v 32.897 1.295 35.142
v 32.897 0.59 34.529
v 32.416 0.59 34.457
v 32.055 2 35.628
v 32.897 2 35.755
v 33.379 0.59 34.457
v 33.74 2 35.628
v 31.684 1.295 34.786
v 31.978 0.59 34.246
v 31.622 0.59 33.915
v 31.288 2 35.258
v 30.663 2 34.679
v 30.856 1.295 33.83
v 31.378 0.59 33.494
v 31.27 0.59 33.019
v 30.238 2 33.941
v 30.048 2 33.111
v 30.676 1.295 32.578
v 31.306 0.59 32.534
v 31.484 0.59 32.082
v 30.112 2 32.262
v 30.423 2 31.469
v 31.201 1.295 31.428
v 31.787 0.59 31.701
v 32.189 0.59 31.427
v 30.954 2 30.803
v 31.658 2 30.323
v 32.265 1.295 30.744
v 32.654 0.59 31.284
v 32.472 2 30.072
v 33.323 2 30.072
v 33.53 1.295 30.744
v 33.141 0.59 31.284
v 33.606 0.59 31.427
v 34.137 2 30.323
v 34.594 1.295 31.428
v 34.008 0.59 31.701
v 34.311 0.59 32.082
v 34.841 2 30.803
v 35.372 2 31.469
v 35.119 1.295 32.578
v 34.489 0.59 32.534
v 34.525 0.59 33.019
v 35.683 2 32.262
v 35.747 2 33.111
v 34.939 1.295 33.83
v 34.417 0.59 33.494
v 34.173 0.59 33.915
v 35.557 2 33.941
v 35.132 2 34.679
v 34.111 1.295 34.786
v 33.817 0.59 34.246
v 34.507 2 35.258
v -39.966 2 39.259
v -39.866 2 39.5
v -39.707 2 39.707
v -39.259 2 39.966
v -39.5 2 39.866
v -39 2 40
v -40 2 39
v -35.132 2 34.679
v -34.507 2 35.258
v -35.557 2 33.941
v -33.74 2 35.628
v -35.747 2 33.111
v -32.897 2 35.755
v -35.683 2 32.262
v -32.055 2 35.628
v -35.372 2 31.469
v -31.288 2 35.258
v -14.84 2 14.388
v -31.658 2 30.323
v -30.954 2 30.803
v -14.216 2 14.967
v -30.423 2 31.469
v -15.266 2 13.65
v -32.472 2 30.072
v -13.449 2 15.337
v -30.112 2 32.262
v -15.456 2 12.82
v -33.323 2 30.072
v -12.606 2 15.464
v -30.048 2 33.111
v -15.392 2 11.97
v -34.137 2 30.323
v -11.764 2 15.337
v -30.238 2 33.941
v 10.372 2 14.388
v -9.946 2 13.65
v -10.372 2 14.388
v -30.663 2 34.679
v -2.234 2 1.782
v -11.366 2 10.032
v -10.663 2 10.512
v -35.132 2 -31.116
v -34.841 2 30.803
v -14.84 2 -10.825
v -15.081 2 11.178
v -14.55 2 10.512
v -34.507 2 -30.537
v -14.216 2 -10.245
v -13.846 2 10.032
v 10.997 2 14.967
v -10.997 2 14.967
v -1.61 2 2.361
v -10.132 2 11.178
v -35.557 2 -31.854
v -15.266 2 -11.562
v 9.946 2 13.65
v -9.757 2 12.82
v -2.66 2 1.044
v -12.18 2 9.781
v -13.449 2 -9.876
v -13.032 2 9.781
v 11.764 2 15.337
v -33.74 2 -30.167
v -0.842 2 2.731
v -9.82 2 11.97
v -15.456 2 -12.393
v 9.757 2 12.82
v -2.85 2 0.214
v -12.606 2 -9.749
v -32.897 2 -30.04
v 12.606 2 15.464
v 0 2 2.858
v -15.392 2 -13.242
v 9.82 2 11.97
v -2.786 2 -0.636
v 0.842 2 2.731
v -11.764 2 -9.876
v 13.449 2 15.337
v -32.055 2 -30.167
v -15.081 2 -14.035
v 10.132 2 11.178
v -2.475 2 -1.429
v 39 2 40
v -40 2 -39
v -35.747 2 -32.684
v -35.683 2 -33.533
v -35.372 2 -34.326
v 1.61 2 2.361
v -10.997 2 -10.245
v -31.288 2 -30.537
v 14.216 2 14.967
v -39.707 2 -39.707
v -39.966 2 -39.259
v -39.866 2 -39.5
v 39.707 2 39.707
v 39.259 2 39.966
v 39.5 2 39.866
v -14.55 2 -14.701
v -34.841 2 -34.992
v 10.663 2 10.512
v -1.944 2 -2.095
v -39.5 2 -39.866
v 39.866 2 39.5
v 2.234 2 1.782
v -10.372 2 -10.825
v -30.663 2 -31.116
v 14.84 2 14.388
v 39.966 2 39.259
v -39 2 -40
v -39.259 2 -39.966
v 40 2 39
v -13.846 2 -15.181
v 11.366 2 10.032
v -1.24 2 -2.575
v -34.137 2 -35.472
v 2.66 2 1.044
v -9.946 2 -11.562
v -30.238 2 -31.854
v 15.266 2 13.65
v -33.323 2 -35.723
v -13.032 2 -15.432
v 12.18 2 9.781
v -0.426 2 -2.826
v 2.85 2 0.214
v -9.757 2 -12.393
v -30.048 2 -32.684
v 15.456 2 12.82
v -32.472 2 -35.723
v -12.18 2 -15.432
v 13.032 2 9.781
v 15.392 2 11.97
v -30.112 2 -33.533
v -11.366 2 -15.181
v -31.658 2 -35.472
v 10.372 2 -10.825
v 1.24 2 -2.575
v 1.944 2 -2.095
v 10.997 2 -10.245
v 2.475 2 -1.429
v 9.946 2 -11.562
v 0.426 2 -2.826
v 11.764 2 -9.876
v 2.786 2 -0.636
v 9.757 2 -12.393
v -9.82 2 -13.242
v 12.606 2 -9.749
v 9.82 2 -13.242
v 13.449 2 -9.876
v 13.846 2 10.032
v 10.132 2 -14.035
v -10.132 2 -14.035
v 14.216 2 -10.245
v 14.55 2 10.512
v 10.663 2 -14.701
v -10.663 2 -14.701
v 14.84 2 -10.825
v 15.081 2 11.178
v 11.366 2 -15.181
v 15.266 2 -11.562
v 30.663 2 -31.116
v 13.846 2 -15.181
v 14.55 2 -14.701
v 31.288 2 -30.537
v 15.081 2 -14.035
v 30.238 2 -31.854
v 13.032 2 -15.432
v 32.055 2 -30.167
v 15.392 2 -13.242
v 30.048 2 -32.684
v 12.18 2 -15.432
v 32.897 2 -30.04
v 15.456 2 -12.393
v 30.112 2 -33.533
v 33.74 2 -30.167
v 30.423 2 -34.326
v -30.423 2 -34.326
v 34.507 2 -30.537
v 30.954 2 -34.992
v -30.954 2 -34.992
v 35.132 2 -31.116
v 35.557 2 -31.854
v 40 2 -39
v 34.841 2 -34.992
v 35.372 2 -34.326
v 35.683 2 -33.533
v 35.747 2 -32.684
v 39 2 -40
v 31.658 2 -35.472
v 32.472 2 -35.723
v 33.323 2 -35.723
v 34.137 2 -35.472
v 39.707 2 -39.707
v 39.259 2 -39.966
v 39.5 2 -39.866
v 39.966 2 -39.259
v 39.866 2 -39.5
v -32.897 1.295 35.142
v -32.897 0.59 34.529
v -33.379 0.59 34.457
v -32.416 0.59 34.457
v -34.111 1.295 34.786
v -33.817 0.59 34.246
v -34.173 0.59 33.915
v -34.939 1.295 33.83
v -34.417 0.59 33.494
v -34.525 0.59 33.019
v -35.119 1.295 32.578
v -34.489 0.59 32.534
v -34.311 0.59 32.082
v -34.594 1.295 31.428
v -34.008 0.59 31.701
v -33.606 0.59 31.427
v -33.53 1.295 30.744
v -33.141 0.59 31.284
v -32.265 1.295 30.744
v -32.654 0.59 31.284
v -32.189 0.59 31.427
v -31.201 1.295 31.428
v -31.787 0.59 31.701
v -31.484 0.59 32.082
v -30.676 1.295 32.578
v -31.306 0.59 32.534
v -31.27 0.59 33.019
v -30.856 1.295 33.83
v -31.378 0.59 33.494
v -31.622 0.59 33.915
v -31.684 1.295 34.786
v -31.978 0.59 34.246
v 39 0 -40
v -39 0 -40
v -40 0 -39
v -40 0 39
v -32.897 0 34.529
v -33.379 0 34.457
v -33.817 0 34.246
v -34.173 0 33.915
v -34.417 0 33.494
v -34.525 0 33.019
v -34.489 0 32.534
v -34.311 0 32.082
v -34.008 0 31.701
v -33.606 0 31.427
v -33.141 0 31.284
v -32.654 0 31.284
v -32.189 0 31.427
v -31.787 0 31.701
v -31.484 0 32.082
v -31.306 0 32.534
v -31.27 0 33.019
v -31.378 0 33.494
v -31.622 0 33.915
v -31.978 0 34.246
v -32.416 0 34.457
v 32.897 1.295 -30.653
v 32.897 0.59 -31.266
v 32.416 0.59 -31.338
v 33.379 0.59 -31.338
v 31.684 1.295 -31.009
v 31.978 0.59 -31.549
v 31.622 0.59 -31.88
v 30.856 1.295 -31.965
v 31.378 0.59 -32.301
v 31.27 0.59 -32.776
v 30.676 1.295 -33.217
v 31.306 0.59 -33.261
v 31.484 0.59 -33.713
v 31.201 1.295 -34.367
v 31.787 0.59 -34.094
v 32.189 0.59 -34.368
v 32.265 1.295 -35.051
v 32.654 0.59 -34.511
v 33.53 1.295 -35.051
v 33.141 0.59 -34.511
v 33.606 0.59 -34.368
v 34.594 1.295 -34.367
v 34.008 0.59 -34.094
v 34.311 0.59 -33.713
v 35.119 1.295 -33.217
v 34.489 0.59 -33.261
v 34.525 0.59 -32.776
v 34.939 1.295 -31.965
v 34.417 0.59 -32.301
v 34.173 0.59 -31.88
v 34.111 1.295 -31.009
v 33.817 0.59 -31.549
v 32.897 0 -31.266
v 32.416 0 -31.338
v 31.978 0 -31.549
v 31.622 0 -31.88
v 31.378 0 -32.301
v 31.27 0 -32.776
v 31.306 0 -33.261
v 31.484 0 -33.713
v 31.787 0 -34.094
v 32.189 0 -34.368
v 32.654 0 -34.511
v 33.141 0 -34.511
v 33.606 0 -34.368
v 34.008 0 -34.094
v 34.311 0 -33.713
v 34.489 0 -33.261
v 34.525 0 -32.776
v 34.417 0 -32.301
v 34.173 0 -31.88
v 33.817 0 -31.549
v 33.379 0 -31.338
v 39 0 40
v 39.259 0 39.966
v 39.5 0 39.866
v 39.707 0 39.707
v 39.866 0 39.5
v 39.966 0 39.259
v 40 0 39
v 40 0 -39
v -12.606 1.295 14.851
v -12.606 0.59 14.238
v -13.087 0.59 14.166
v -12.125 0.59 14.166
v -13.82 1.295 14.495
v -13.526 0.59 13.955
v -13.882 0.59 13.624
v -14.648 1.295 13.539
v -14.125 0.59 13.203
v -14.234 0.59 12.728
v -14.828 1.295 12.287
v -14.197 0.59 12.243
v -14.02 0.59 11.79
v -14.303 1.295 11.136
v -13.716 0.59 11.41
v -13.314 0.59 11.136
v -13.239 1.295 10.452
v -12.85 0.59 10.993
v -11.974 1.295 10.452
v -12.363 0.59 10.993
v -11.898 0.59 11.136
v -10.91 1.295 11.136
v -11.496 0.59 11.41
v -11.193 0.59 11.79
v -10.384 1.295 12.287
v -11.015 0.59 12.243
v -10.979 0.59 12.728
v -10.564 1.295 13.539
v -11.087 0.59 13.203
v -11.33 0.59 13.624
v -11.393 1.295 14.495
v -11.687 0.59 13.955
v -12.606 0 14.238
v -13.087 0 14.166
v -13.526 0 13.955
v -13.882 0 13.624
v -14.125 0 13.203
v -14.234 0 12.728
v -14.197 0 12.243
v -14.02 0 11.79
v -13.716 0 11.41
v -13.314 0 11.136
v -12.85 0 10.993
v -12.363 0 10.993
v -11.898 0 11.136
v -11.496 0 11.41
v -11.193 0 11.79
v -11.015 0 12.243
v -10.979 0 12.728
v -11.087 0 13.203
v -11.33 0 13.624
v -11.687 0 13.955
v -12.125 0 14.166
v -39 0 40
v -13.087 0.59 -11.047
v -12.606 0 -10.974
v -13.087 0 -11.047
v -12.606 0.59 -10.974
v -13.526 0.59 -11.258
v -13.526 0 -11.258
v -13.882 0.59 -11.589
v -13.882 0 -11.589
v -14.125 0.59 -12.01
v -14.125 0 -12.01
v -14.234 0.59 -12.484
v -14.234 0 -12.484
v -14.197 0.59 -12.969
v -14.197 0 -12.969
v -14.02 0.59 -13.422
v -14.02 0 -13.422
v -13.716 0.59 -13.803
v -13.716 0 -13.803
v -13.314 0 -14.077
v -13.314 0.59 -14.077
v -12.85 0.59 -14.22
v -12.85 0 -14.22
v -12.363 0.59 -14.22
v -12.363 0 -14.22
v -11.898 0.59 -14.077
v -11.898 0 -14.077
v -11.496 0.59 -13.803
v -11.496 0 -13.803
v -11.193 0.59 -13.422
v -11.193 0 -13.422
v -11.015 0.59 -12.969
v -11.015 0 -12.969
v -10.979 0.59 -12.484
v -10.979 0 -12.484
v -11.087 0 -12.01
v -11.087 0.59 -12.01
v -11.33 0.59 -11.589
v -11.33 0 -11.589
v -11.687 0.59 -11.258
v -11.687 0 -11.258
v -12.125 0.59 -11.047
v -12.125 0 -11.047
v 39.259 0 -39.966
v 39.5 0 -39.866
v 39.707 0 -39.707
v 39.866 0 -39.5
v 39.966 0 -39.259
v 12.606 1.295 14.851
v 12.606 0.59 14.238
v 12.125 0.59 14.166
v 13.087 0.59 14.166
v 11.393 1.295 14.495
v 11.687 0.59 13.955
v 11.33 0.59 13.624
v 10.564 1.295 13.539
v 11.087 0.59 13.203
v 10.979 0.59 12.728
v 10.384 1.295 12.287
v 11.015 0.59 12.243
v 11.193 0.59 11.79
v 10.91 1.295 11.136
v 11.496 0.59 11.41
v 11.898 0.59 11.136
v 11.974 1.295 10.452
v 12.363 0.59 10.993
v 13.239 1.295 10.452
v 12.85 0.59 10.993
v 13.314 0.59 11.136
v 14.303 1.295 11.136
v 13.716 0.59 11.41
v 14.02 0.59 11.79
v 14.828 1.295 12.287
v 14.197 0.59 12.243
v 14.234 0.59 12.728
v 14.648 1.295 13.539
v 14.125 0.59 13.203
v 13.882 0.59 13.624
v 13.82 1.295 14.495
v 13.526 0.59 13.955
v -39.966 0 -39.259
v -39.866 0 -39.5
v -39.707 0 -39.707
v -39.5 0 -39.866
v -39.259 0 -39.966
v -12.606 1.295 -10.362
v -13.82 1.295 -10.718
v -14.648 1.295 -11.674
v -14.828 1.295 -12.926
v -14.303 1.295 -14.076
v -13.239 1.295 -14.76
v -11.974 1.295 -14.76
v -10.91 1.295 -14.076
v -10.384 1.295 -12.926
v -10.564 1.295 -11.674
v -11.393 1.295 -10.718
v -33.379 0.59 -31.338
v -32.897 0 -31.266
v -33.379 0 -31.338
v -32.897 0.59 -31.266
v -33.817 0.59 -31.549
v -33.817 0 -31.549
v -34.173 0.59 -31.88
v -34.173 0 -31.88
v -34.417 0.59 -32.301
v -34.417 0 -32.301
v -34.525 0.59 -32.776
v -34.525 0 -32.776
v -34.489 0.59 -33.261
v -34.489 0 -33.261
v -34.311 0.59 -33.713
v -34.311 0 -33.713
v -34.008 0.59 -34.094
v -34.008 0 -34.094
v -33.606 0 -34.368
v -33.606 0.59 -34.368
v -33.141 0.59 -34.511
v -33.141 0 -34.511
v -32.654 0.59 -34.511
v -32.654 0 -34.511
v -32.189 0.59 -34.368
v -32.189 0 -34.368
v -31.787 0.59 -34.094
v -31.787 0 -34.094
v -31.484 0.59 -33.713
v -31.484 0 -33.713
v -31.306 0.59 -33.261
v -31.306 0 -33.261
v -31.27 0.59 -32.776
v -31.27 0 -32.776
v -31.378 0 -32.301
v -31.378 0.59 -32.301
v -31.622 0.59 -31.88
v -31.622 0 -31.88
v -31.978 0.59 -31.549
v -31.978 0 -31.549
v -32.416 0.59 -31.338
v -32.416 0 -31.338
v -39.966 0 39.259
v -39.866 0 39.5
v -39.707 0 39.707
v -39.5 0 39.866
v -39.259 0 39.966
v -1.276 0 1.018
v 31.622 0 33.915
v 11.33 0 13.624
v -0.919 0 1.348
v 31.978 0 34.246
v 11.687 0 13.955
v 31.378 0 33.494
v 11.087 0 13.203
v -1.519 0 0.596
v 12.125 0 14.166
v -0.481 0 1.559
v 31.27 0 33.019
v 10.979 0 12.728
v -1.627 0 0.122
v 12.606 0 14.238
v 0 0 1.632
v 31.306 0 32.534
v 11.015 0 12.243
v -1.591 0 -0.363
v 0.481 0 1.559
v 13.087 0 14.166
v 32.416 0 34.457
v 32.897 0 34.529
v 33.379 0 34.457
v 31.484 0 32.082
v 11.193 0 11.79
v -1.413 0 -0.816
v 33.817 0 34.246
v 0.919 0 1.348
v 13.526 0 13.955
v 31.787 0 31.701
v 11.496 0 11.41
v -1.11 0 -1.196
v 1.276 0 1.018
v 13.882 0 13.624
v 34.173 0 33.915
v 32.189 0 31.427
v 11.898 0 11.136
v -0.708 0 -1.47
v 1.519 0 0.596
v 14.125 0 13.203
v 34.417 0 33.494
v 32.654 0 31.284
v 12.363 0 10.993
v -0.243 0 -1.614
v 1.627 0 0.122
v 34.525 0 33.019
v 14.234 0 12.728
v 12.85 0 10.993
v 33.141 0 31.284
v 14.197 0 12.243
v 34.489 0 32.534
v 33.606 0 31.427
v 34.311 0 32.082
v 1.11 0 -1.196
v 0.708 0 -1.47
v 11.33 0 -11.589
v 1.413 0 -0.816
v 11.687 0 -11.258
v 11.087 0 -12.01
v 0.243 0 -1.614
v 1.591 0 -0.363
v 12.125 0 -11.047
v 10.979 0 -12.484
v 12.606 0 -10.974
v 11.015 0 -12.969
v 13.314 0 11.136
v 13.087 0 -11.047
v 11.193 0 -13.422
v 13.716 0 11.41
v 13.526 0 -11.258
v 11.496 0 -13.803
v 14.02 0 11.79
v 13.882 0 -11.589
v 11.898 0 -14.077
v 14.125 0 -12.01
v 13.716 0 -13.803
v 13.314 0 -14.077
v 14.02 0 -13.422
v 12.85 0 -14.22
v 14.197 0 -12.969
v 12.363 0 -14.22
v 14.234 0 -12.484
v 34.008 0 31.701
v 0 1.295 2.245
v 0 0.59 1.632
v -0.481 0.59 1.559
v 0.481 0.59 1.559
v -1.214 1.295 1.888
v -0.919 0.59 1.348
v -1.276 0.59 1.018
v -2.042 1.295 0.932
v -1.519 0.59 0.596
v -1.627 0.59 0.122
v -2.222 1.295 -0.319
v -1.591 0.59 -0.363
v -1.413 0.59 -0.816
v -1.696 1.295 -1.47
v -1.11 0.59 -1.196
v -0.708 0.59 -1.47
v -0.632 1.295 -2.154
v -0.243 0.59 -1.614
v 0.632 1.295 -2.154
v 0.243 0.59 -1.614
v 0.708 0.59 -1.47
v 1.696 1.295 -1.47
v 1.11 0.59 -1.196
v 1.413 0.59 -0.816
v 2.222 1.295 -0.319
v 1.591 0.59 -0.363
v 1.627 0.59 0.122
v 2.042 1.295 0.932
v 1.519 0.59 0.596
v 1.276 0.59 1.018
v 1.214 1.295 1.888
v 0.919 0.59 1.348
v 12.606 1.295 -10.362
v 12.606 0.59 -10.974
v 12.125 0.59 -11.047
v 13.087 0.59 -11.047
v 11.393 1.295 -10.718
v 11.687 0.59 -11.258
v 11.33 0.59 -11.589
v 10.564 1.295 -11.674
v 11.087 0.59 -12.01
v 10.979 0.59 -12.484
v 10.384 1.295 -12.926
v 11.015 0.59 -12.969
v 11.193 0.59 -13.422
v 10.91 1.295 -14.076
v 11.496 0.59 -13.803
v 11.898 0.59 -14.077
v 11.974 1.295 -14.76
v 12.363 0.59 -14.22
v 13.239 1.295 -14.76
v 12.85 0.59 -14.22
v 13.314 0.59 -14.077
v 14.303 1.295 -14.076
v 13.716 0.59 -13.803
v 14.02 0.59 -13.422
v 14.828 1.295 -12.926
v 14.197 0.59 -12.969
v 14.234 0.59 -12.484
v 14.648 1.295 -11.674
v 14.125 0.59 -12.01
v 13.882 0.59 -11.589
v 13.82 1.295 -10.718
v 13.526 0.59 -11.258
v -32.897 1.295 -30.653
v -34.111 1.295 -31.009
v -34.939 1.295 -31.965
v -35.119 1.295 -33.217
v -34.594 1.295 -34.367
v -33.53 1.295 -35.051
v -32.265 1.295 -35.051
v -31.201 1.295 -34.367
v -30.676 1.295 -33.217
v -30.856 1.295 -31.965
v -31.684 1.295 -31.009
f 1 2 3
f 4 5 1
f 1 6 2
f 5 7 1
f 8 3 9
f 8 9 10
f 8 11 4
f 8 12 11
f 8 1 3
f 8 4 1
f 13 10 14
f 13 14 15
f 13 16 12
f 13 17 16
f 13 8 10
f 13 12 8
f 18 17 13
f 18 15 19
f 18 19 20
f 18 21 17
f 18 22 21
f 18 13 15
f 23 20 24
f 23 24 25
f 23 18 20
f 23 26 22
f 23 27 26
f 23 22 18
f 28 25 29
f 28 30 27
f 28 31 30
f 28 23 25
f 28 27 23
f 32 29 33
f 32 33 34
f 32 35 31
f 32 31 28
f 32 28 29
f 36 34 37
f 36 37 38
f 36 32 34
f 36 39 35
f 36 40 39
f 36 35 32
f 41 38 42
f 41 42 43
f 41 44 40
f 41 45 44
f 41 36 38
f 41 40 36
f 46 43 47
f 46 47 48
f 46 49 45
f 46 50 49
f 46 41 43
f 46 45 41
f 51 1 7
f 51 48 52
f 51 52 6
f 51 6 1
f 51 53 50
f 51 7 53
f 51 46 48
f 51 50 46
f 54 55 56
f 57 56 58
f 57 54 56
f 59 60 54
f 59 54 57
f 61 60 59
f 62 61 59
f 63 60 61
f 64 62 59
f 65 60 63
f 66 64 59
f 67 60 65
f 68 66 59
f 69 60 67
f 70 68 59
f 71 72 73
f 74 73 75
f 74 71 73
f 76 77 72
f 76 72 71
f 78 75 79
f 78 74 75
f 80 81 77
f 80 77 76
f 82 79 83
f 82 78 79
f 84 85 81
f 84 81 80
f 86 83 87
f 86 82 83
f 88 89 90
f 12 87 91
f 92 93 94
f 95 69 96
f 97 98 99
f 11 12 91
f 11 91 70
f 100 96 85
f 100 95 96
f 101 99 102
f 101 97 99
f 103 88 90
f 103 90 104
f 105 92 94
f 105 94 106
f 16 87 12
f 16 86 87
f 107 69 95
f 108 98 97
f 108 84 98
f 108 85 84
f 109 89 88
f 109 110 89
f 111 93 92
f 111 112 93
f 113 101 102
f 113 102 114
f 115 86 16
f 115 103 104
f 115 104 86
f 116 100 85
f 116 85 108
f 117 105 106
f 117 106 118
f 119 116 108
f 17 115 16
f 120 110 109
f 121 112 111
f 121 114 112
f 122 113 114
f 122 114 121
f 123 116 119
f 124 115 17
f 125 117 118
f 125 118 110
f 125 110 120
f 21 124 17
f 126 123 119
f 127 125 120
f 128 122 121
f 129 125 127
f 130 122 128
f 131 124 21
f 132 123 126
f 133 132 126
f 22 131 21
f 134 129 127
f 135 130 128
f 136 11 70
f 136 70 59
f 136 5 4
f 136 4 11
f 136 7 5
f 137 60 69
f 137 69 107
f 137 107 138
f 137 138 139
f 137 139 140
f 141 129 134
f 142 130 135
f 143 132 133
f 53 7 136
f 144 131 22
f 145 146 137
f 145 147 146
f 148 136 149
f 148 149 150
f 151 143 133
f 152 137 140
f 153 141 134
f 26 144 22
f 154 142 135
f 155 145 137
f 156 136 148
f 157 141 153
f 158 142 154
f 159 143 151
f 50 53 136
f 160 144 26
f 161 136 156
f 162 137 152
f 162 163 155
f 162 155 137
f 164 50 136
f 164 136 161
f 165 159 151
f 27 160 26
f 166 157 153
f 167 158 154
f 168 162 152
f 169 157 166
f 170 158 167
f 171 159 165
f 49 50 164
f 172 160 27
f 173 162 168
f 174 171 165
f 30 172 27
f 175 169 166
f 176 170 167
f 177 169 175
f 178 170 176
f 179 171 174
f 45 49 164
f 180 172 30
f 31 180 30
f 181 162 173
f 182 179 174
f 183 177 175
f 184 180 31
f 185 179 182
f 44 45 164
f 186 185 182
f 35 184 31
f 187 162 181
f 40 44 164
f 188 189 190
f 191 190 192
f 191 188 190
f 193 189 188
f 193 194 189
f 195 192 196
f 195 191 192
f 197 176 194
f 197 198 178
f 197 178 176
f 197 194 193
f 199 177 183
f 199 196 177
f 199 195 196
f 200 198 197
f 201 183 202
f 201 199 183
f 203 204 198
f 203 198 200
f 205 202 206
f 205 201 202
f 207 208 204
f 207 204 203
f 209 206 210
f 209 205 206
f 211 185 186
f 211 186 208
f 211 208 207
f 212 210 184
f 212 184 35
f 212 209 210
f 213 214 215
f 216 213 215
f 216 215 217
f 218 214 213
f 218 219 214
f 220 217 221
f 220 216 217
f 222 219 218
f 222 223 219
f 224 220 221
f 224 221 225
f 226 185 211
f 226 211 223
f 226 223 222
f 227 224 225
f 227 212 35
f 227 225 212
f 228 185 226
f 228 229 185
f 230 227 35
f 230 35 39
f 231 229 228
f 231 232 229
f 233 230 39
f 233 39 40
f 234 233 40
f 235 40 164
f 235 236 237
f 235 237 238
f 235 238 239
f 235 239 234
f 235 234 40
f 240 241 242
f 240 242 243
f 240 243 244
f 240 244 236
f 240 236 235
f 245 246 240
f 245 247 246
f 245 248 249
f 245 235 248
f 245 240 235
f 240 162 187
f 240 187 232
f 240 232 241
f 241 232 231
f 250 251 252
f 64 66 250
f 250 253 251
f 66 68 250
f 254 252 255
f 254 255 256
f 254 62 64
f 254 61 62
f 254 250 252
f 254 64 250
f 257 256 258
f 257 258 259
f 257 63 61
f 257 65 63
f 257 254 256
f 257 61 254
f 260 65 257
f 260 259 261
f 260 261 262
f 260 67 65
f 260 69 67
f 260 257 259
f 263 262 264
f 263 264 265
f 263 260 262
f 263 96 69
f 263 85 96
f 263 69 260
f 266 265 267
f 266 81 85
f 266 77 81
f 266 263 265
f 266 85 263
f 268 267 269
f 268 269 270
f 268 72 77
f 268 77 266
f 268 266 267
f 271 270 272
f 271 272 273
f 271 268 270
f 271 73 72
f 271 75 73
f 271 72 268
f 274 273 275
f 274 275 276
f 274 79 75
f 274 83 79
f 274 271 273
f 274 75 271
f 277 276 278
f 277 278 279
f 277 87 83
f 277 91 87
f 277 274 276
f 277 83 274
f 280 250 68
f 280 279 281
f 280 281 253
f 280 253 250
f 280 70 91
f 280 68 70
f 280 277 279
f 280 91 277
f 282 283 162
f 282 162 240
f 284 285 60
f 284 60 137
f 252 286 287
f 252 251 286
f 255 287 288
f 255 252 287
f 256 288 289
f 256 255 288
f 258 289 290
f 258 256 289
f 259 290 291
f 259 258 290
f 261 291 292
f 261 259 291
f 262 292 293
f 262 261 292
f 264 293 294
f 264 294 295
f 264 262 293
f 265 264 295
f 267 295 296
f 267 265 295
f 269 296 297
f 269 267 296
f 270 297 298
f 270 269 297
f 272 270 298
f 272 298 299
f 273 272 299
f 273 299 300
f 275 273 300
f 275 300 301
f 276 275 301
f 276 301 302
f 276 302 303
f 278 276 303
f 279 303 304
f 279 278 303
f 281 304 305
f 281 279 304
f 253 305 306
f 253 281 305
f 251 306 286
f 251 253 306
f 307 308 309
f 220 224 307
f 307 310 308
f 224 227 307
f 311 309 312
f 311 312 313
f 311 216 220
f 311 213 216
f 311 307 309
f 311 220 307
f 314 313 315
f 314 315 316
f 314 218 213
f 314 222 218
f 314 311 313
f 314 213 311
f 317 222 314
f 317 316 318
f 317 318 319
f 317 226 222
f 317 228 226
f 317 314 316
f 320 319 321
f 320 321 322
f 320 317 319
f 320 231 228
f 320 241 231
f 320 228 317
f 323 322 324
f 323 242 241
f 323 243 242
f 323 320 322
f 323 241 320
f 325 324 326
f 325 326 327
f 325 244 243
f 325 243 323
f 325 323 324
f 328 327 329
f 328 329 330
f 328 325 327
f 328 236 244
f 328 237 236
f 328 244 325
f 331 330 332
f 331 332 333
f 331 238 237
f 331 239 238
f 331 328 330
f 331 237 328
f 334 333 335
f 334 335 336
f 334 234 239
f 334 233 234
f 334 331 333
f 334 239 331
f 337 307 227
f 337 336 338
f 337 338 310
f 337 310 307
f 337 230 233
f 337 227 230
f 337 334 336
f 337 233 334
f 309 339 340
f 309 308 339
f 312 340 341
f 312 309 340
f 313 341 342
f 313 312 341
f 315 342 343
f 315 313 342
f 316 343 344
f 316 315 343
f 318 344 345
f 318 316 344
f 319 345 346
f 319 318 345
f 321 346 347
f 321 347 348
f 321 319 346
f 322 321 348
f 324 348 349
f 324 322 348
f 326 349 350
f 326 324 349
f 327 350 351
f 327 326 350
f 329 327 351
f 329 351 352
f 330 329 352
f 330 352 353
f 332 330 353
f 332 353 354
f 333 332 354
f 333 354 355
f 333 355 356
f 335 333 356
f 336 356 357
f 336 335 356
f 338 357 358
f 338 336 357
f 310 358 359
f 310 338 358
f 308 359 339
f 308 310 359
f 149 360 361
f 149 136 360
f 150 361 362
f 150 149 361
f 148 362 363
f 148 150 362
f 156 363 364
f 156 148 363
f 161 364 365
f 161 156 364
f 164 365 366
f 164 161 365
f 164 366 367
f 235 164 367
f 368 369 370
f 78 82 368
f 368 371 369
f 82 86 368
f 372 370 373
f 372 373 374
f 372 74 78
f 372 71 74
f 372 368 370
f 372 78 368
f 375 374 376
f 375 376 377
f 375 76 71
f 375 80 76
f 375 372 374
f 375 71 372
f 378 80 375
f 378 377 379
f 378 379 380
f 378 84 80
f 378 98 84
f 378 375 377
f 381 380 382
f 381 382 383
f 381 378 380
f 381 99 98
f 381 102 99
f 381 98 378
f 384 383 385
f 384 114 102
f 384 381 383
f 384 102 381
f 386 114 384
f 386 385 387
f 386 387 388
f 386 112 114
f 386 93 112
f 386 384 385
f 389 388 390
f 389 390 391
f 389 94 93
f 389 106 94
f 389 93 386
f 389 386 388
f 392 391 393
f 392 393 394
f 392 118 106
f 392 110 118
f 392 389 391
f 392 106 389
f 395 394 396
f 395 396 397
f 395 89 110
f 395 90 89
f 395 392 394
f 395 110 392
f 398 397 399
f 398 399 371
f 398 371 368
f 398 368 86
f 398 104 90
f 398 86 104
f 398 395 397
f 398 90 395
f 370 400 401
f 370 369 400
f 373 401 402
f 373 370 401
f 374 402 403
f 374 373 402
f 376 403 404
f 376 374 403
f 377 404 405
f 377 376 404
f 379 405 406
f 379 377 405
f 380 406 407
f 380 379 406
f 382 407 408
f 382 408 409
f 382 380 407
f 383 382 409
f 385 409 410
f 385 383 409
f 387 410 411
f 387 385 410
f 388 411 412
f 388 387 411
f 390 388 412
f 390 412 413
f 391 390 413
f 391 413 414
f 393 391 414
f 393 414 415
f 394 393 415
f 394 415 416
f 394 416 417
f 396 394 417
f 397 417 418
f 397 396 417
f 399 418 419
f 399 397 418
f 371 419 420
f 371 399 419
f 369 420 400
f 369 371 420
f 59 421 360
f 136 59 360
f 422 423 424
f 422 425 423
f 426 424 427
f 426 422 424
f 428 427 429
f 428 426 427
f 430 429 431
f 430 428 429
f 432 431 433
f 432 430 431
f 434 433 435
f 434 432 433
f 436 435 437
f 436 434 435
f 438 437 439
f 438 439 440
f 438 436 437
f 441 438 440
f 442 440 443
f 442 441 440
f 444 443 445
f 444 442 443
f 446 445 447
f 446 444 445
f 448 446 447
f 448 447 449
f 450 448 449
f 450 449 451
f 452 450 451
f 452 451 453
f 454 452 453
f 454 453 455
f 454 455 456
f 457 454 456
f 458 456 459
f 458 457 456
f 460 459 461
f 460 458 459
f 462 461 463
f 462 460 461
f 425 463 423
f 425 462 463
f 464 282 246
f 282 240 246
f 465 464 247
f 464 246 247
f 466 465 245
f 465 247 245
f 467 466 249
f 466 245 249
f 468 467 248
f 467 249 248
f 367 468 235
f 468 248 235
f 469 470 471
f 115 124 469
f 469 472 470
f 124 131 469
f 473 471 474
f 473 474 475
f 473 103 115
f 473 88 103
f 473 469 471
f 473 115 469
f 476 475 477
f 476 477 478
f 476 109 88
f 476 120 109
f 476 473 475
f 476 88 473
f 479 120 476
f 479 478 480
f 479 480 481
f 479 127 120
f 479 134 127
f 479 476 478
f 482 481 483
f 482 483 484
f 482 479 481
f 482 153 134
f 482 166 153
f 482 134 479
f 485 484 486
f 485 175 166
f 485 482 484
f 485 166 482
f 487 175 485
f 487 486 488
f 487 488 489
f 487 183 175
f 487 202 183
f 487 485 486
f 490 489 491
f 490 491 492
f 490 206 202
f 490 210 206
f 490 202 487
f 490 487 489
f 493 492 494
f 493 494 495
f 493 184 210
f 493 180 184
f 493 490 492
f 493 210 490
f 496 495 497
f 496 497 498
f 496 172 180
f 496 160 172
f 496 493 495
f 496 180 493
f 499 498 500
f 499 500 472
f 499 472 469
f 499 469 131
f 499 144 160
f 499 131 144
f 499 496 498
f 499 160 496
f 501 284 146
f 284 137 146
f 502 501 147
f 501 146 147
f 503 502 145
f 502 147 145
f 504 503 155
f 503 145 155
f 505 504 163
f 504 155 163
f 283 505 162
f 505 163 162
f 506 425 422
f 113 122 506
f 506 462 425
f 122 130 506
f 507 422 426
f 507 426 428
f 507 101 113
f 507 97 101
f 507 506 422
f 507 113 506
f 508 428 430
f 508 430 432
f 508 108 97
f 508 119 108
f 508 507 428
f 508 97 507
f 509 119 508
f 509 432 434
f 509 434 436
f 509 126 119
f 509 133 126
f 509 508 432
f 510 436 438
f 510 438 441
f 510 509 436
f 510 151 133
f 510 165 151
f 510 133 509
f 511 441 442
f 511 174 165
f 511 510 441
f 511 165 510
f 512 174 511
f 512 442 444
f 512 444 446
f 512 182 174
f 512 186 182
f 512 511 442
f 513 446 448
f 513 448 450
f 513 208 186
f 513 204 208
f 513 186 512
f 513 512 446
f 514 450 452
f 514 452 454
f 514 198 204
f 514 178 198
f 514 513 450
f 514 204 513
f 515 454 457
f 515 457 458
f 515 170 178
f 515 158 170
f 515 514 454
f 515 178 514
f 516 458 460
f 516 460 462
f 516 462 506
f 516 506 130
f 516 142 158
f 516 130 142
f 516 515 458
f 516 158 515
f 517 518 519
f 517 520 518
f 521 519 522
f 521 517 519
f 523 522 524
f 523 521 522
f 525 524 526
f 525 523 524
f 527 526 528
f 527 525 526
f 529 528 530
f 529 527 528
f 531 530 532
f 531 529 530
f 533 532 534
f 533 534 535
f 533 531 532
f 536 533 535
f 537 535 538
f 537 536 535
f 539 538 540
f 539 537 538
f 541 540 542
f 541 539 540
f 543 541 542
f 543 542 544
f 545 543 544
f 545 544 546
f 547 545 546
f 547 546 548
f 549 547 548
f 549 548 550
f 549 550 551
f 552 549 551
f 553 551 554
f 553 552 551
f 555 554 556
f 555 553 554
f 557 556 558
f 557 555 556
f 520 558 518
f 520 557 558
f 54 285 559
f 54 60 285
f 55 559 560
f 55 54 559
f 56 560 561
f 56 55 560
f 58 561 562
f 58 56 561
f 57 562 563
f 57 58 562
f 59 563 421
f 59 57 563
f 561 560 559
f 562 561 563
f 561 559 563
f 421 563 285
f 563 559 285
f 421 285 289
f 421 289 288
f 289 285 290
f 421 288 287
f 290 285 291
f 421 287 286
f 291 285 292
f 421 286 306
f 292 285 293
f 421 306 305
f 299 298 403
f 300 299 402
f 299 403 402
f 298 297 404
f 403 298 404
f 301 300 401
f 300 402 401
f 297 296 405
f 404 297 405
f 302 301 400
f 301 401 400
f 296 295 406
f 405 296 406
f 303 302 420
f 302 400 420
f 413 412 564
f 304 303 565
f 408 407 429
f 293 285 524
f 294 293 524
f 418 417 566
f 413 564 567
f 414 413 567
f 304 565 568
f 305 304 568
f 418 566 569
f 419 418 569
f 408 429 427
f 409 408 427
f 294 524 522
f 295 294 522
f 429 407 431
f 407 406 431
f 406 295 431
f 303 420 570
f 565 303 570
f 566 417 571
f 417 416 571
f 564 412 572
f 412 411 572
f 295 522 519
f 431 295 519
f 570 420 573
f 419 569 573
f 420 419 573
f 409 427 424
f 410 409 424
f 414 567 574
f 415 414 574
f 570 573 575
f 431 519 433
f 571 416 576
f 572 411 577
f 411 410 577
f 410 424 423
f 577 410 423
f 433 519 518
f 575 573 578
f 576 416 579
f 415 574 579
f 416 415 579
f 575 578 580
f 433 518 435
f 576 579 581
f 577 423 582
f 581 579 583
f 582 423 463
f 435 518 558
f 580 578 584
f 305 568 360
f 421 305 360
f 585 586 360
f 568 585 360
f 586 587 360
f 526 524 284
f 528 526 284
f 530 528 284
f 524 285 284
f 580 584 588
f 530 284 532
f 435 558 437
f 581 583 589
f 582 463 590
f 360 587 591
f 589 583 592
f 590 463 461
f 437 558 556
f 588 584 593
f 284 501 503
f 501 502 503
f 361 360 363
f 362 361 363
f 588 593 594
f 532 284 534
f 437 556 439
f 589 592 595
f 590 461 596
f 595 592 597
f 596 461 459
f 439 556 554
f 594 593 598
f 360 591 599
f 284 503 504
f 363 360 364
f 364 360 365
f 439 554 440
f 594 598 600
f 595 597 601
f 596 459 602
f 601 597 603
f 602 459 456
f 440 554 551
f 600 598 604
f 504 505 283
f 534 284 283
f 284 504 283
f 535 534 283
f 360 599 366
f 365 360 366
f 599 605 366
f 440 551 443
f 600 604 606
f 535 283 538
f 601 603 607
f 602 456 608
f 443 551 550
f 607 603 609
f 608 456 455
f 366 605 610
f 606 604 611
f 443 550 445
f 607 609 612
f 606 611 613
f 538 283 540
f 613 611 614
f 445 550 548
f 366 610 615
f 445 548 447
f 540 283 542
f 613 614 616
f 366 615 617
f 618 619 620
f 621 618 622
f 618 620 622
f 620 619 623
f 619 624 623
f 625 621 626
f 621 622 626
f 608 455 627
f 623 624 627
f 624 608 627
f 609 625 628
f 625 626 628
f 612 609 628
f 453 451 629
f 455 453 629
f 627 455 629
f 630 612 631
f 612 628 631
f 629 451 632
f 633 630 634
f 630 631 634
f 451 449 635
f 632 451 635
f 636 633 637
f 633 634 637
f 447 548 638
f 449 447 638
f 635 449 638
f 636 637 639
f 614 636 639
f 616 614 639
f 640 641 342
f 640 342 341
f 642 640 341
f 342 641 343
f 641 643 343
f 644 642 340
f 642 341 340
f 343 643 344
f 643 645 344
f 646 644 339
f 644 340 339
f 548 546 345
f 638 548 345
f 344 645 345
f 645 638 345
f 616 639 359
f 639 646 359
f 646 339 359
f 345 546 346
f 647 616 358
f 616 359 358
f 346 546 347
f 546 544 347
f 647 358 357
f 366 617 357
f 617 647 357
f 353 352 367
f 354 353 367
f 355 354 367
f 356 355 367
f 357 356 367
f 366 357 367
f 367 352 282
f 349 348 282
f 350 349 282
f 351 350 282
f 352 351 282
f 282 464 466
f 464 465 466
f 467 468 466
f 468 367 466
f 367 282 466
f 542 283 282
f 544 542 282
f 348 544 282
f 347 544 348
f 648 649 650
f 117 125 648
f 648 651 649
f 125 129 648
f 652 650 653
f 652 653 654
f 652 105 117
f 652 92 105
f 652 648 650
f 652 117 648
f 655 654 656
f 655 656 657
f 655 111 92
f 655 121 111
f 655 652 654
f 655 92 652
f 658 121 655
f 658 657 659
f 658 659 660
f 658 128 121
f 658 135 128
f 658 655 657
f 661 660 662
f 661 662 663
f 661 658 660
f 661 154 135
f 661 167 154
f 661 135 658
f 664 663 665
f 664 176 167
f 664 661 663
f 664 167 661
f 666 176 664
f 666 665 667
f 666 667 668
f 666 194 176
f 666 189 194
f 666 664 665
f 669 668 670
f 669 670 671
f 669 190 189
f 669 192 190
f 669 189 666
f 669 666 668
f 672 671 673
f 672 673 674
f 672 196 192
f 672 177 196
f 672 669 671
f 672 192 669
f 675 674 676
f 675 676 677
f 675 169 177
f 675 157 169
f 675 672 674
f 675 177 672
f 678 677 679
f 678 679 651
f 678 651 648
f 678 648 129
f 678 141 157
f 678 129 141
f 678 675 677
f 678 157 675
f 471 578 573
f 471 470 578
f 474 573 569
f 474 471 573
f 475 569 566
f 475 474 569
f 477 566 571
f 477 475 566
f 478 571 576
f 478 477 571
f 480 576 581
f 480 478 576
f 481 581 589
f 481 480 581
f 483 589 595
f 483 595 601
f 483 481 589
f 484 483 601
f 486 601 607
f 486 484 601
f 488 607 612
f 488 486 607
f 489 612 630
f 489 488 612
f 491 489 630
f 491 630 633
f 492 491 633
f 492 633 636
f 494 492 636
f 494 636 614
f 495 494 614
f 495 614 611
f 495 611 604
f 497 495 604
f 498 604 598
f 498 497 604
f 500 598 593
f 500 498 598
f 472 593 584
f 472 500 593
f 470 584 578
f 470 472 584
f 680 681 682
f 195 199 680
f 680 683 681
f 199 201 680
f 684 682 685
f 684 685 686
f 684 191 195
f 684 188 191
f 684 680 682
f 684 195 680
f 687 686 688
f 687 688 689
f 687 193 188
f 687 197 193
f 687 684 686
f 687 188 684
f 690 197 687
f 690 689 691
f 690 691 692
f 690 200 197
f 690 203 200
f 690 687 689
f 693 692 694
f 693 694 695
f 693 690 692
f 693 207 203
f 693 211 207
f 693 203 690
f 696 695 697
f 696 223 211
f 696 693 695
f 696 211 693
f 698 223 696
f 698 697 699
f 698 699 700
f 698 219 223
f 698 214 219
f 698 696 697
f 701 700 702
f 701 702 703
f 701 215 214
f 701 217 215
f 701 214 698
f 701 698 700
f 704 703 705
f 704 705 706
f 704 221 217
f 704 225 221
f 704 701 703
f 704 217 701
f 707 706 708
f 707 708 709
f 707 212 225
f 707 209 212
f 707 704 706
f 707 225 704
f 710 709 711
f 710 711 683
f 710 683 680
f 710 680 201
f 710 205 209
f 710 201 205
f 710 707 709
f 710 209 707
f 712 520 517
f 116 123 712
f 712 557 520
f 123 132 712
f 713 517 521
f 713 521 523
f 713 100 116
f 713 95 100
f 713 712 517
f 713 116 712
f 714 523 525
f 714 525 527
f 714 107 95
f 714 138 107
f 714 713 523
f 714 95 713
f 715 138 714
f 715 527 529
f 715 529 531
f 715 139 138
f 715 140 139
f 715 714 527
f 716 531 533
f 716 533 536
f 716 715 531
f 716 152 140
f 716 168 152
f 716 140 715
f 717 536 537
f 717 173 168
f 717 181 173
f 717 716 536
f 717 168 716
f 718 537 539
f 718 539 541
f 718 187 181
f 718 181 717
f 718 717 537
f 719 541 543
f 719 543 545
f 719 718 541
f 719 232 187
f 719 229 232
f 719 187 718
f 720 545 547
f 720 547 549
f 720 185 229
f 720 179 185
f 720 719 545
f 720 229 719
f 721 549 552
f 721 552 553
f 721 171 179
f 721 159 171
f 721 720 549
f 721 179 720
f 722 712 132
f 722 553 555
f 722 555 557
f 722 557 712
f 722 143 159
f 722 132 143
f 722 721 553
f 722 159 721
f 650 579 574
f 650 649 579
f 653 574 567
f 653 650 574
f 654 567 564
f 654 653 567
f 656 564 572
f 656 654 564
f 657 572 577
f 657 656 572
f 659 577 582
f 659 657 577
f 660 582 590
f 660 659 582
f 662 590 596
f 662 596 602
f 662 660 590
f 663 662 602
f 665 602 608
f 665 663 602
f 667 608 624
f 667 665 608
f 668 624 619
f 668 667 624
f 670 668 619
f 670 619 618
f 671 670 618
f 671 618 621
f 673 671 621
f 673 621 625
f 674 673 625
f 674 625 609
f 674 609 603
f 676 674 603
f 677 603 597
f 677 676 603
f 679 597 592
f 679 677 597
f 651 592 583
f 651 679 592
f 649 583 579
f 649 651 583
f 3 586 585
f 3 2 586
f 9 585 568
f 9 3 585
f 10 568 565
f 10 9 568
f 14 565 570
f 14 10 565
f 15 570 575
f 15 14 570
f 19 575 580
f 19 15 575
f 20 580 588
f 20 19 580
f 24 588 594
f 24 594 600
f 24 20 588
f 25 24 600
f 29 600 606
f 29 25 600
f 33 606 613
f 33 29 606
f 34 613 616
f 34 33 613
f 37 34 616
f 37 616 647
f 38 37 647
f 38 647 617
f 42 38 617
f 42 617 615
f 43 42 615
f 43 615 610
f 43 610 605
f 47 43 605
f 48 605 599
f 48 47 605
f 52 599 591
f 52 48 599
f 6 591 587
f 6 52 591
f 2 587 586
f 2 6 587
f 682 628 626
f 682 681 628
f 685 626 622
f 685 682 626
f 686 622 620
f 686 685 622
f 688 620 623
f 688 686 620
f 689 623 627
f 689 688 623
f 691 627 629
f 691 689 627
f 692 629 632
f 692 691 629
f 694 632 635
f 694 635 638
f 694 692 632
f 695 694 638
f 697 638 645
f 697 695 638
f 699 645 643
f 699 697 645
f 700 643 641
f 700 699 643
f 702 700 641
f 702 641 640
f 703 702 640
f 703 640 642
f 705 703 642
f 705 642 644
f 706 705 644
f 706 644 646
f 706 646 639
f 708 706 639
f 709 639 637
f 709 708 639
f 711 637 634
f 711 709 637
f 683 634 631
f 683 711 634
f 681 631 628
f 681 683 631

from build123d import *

# Parameters (mm, degrees)
ESQUISSE1_W                                  = 80
ESQUISSE1_H                                  = 80
BOSS_EXTRU_1_DEPTH                           = 2
FRAISAGE_POUR_VIS_T_TE_FRAIS_E_BOM_2_COUNT   = 2
FRAISAGE_POUR_VIS_T_TE_FRAIS_E_BOM_2_PITCH   = 65.794986025
FRAISAGE_POUR_VIS_T_TE_FRAIS_E_BOM_3_COUNT   = 2
FRAISAGE_POUR_VIS_T_TE_FRAIS_E_BOM_3_PITCH   = 93.048161572
FRAISAGE_POUR_VIS_T_TE_FRAIS_E_BOM_4_COUNT   = 2
FRAISAGE_POUR_VIS_T_TE_FRAIS_E_BOM_4_PITCH   = 65.794986025
FRAISAGE_POUR_VIS_T_TE_FRAIS_E_BOM_6_A_COUNT = 2
FRAISAGE_POUR_VIS_T_TE_FRAIS_E_BOM_6_A_PITCH = 25.212578074
FRAISAGE_POUR_VIS_T_TE_FRAIS_E_BOM_7_COUNT   = 2
FRAISAGE_POUR_VIS_T_TE_FRAIS_E_BOM_7_PITCH   = 35.655969855
FRAISAGE_POUR_VIS_T_TE_FRAIS_E_BOM_8_COUNT   = 2
FRAISAGE_POUR_VIS_T_TE_FRAIS_E_BOM_8_PITCH   = 25.212578074
CONG_1_R                                     = 1
CONG_2_R                                     = 1


with BuildPart() as part:
    # Esquisse1 → Boss.-Extru.1 (new body)
    with BuildSketch(Plane(origin=(0, 0, 0), x_dir=(1, 0, 0), z_dir=(0, 1, 0))):
        Rectangle(ESQUISSE1_W, ESQUISSE1_H)
    extrude(amount=BOSS_EXTRU_1_DEPTH)

    # Esquisse3 → Fraisage pour vis _ t_te frais_e bomb_e (revolve, cut)
    with BuildSketch(Plane(origin=(-32.897493012, 2, -32.897493012), x_dir=(0, 0, 1), z_dir=(1, 0, 0))):
        Polygon((0, 0), (0, 2), (1.63195, 2), (1.63195, 1.409834001), (2.8575, 0), align=None)
    fraisage_pour_vis_t_te_frais_e_bomb_e = revolve(axis=Axis((-32.897493012, 8.35, -32.897493012), (0, -1, 0)), mode=Mode.SUBTRACT)

    # Fraisage pour vis _ t_te frais_e bom 2: Fraisage pour vis _ t_te frais_e bomb_e ×2
    with Locations(*[(i * FRAISAGE_POUR_VIS_T_TE_FRAIS_E_BOM_2_PITCH, 0, 0) for i in range(1, FRAISAGE_POUR_VIS_T_TE_FRAIS_E_BOM_2_COUNT)]):
        add(fraisage_pour_vis_t_te_frais_e_bomb_e, mode=Mode.SUBTRACT)

    # Fraisage pour vis _ t_te frais_e bom 3: Fraisage pour vis _ t_te frais_e bomb_e ×2
    with Locations(*[Vector(0.707106781, 0, 0.707106781) * (i * FRAISAGE_POUR_VIS_T_TE_FRAIS_E_BOM_3_PITCH) for i in range(1, FRAISAGE_POUR_VIS_T_TE_FRAIS_E_BOM_3_COUNT)]):
        add(fraisage_pour_vis_t_te_frais_e_bomb_e, mode=Mode.SUBTRACT)

    # Fraisage pour vis _ t_te frais_e bom 4: Fraisage pour vis _ t_te frais_e bomb_e ×2
    with Locations(*[(0, 0, i * FRAISAGE_POUR_VIS_T_TE_FRAIS_E_BOM_4_PITCH) for i in range(1, FRAISAGE_POUR_VIS_T_TE_FRAIS_E_BOM_4_COUNT)]):
        add(fraisage_pour_vis_t_te_frais_e_bomb_e, mode=Mode.SUBTRACT)

    # Esquisse6 → Fraisage pour vis _ t_te frais_e bom 5 (revolve, cut)
    with BuildSketch(Plane(origin=(0, 2, 0), x_dir=(0, 0, 1), z_dir=(1, 0, 0))):
        Polygon((0, 0), (0, 2), (1.63195, 2), (1.63195, 1.409834001), (2.8575, 0), align=None)
    revolve(axis=Axis((0, 8.35, 0), (0, -1, 0)), mode=Mode.SUBTRACT)

    # Esquisse8 → Fraisage pour vis _ t_te frais_e bom 6 (revolve, cut)
    with BuildSketch(Plane(origin=(-12.606289037, 2, -12.606289037), x_dir=(0, 0, 1), z_dir=(1, 0, 0))):
        Polygon((0, 0), (0, 2), (1.63195, 2), (1.63195, 1.409834001), (2.8575, 0), align=None)
    fraisage_pour_vis_t_te_frais_e_bom_6 = revolve(axis=Axis((-12.606289037, 8.35, -12.606289037), (0, -1, 0)), mode=Mode.SUBTRACT)

    # Fraisage pour vis _ t_te frais_e bom 6 a: Fraisage pour vis _ t_te frais_e bom 6 ×2
    with Locations(*[(i * FRAISAGE_POUR_VIS_T_TE_FRAIS_E_BOM_6_A_PITCH, 0, 0) for i in range(1, FRAISAGE_POUR_VIS_T_TE_FRAIS_E_BOM_6_A_COUNT)]):
        add(fraisage_pour_vis_t_te_frais_e_bom_6, mode=Mode.SUBTRACT)

    # Fraisage pour vis _ t_te frais_e bom 7: Fraisage pour vis _ t_te frais_e bom 6 ×2
    with Locations(*[Vector(0.707106781, 0, 0.707106781) * (i * FRAISAGE_POUR_VIS_T_TE_FRAIS_E_BOM_7_PITCH) for i in range(1, FRAISAGE_POUR_VIS_T_TE_FRAIS_E_BOM_7_COUNT)]):
        add(fraisage_pour_vis_t_te_frais_e_bom_6, mode=Mode.SUBTRACT)

    # Fraisage pour vis _ t_te frais_e bom 8: Fraisage pour vis _ t_te frais_e bom 6 ×2
    with Locations(*[(0, 0, i * FRAISAGE_POUR_VIS_T_TE_FRAIS_E_BOM_8_PITCH) for i in range(1, FRAISAGE_POUR_VIS_T_TE_FRAIS_E_BOM_8_COUNT)]):
        add(fraisage_pour_vis_t_te_frais_e_bom_6, mode=Mode.SUBTRACT)

    # Congé1
    cong_1_edges = [part.edges().sort_by_distance(p)[0] for p in [
        (-40, 1, 40),
    ]]
    fillet(cong_1_edges, radius=CONG_1_R)

    # Congé2
    cong_2_edges = [part.edges().sort_by_distance(p)[0] for p in [
        (40, 1, 40),
        (-40, 1, -40),
        (40, 1, -40),
    ]]
    fillet(cong_2_edges, radius=CONG_2_R)


solid = part.part
